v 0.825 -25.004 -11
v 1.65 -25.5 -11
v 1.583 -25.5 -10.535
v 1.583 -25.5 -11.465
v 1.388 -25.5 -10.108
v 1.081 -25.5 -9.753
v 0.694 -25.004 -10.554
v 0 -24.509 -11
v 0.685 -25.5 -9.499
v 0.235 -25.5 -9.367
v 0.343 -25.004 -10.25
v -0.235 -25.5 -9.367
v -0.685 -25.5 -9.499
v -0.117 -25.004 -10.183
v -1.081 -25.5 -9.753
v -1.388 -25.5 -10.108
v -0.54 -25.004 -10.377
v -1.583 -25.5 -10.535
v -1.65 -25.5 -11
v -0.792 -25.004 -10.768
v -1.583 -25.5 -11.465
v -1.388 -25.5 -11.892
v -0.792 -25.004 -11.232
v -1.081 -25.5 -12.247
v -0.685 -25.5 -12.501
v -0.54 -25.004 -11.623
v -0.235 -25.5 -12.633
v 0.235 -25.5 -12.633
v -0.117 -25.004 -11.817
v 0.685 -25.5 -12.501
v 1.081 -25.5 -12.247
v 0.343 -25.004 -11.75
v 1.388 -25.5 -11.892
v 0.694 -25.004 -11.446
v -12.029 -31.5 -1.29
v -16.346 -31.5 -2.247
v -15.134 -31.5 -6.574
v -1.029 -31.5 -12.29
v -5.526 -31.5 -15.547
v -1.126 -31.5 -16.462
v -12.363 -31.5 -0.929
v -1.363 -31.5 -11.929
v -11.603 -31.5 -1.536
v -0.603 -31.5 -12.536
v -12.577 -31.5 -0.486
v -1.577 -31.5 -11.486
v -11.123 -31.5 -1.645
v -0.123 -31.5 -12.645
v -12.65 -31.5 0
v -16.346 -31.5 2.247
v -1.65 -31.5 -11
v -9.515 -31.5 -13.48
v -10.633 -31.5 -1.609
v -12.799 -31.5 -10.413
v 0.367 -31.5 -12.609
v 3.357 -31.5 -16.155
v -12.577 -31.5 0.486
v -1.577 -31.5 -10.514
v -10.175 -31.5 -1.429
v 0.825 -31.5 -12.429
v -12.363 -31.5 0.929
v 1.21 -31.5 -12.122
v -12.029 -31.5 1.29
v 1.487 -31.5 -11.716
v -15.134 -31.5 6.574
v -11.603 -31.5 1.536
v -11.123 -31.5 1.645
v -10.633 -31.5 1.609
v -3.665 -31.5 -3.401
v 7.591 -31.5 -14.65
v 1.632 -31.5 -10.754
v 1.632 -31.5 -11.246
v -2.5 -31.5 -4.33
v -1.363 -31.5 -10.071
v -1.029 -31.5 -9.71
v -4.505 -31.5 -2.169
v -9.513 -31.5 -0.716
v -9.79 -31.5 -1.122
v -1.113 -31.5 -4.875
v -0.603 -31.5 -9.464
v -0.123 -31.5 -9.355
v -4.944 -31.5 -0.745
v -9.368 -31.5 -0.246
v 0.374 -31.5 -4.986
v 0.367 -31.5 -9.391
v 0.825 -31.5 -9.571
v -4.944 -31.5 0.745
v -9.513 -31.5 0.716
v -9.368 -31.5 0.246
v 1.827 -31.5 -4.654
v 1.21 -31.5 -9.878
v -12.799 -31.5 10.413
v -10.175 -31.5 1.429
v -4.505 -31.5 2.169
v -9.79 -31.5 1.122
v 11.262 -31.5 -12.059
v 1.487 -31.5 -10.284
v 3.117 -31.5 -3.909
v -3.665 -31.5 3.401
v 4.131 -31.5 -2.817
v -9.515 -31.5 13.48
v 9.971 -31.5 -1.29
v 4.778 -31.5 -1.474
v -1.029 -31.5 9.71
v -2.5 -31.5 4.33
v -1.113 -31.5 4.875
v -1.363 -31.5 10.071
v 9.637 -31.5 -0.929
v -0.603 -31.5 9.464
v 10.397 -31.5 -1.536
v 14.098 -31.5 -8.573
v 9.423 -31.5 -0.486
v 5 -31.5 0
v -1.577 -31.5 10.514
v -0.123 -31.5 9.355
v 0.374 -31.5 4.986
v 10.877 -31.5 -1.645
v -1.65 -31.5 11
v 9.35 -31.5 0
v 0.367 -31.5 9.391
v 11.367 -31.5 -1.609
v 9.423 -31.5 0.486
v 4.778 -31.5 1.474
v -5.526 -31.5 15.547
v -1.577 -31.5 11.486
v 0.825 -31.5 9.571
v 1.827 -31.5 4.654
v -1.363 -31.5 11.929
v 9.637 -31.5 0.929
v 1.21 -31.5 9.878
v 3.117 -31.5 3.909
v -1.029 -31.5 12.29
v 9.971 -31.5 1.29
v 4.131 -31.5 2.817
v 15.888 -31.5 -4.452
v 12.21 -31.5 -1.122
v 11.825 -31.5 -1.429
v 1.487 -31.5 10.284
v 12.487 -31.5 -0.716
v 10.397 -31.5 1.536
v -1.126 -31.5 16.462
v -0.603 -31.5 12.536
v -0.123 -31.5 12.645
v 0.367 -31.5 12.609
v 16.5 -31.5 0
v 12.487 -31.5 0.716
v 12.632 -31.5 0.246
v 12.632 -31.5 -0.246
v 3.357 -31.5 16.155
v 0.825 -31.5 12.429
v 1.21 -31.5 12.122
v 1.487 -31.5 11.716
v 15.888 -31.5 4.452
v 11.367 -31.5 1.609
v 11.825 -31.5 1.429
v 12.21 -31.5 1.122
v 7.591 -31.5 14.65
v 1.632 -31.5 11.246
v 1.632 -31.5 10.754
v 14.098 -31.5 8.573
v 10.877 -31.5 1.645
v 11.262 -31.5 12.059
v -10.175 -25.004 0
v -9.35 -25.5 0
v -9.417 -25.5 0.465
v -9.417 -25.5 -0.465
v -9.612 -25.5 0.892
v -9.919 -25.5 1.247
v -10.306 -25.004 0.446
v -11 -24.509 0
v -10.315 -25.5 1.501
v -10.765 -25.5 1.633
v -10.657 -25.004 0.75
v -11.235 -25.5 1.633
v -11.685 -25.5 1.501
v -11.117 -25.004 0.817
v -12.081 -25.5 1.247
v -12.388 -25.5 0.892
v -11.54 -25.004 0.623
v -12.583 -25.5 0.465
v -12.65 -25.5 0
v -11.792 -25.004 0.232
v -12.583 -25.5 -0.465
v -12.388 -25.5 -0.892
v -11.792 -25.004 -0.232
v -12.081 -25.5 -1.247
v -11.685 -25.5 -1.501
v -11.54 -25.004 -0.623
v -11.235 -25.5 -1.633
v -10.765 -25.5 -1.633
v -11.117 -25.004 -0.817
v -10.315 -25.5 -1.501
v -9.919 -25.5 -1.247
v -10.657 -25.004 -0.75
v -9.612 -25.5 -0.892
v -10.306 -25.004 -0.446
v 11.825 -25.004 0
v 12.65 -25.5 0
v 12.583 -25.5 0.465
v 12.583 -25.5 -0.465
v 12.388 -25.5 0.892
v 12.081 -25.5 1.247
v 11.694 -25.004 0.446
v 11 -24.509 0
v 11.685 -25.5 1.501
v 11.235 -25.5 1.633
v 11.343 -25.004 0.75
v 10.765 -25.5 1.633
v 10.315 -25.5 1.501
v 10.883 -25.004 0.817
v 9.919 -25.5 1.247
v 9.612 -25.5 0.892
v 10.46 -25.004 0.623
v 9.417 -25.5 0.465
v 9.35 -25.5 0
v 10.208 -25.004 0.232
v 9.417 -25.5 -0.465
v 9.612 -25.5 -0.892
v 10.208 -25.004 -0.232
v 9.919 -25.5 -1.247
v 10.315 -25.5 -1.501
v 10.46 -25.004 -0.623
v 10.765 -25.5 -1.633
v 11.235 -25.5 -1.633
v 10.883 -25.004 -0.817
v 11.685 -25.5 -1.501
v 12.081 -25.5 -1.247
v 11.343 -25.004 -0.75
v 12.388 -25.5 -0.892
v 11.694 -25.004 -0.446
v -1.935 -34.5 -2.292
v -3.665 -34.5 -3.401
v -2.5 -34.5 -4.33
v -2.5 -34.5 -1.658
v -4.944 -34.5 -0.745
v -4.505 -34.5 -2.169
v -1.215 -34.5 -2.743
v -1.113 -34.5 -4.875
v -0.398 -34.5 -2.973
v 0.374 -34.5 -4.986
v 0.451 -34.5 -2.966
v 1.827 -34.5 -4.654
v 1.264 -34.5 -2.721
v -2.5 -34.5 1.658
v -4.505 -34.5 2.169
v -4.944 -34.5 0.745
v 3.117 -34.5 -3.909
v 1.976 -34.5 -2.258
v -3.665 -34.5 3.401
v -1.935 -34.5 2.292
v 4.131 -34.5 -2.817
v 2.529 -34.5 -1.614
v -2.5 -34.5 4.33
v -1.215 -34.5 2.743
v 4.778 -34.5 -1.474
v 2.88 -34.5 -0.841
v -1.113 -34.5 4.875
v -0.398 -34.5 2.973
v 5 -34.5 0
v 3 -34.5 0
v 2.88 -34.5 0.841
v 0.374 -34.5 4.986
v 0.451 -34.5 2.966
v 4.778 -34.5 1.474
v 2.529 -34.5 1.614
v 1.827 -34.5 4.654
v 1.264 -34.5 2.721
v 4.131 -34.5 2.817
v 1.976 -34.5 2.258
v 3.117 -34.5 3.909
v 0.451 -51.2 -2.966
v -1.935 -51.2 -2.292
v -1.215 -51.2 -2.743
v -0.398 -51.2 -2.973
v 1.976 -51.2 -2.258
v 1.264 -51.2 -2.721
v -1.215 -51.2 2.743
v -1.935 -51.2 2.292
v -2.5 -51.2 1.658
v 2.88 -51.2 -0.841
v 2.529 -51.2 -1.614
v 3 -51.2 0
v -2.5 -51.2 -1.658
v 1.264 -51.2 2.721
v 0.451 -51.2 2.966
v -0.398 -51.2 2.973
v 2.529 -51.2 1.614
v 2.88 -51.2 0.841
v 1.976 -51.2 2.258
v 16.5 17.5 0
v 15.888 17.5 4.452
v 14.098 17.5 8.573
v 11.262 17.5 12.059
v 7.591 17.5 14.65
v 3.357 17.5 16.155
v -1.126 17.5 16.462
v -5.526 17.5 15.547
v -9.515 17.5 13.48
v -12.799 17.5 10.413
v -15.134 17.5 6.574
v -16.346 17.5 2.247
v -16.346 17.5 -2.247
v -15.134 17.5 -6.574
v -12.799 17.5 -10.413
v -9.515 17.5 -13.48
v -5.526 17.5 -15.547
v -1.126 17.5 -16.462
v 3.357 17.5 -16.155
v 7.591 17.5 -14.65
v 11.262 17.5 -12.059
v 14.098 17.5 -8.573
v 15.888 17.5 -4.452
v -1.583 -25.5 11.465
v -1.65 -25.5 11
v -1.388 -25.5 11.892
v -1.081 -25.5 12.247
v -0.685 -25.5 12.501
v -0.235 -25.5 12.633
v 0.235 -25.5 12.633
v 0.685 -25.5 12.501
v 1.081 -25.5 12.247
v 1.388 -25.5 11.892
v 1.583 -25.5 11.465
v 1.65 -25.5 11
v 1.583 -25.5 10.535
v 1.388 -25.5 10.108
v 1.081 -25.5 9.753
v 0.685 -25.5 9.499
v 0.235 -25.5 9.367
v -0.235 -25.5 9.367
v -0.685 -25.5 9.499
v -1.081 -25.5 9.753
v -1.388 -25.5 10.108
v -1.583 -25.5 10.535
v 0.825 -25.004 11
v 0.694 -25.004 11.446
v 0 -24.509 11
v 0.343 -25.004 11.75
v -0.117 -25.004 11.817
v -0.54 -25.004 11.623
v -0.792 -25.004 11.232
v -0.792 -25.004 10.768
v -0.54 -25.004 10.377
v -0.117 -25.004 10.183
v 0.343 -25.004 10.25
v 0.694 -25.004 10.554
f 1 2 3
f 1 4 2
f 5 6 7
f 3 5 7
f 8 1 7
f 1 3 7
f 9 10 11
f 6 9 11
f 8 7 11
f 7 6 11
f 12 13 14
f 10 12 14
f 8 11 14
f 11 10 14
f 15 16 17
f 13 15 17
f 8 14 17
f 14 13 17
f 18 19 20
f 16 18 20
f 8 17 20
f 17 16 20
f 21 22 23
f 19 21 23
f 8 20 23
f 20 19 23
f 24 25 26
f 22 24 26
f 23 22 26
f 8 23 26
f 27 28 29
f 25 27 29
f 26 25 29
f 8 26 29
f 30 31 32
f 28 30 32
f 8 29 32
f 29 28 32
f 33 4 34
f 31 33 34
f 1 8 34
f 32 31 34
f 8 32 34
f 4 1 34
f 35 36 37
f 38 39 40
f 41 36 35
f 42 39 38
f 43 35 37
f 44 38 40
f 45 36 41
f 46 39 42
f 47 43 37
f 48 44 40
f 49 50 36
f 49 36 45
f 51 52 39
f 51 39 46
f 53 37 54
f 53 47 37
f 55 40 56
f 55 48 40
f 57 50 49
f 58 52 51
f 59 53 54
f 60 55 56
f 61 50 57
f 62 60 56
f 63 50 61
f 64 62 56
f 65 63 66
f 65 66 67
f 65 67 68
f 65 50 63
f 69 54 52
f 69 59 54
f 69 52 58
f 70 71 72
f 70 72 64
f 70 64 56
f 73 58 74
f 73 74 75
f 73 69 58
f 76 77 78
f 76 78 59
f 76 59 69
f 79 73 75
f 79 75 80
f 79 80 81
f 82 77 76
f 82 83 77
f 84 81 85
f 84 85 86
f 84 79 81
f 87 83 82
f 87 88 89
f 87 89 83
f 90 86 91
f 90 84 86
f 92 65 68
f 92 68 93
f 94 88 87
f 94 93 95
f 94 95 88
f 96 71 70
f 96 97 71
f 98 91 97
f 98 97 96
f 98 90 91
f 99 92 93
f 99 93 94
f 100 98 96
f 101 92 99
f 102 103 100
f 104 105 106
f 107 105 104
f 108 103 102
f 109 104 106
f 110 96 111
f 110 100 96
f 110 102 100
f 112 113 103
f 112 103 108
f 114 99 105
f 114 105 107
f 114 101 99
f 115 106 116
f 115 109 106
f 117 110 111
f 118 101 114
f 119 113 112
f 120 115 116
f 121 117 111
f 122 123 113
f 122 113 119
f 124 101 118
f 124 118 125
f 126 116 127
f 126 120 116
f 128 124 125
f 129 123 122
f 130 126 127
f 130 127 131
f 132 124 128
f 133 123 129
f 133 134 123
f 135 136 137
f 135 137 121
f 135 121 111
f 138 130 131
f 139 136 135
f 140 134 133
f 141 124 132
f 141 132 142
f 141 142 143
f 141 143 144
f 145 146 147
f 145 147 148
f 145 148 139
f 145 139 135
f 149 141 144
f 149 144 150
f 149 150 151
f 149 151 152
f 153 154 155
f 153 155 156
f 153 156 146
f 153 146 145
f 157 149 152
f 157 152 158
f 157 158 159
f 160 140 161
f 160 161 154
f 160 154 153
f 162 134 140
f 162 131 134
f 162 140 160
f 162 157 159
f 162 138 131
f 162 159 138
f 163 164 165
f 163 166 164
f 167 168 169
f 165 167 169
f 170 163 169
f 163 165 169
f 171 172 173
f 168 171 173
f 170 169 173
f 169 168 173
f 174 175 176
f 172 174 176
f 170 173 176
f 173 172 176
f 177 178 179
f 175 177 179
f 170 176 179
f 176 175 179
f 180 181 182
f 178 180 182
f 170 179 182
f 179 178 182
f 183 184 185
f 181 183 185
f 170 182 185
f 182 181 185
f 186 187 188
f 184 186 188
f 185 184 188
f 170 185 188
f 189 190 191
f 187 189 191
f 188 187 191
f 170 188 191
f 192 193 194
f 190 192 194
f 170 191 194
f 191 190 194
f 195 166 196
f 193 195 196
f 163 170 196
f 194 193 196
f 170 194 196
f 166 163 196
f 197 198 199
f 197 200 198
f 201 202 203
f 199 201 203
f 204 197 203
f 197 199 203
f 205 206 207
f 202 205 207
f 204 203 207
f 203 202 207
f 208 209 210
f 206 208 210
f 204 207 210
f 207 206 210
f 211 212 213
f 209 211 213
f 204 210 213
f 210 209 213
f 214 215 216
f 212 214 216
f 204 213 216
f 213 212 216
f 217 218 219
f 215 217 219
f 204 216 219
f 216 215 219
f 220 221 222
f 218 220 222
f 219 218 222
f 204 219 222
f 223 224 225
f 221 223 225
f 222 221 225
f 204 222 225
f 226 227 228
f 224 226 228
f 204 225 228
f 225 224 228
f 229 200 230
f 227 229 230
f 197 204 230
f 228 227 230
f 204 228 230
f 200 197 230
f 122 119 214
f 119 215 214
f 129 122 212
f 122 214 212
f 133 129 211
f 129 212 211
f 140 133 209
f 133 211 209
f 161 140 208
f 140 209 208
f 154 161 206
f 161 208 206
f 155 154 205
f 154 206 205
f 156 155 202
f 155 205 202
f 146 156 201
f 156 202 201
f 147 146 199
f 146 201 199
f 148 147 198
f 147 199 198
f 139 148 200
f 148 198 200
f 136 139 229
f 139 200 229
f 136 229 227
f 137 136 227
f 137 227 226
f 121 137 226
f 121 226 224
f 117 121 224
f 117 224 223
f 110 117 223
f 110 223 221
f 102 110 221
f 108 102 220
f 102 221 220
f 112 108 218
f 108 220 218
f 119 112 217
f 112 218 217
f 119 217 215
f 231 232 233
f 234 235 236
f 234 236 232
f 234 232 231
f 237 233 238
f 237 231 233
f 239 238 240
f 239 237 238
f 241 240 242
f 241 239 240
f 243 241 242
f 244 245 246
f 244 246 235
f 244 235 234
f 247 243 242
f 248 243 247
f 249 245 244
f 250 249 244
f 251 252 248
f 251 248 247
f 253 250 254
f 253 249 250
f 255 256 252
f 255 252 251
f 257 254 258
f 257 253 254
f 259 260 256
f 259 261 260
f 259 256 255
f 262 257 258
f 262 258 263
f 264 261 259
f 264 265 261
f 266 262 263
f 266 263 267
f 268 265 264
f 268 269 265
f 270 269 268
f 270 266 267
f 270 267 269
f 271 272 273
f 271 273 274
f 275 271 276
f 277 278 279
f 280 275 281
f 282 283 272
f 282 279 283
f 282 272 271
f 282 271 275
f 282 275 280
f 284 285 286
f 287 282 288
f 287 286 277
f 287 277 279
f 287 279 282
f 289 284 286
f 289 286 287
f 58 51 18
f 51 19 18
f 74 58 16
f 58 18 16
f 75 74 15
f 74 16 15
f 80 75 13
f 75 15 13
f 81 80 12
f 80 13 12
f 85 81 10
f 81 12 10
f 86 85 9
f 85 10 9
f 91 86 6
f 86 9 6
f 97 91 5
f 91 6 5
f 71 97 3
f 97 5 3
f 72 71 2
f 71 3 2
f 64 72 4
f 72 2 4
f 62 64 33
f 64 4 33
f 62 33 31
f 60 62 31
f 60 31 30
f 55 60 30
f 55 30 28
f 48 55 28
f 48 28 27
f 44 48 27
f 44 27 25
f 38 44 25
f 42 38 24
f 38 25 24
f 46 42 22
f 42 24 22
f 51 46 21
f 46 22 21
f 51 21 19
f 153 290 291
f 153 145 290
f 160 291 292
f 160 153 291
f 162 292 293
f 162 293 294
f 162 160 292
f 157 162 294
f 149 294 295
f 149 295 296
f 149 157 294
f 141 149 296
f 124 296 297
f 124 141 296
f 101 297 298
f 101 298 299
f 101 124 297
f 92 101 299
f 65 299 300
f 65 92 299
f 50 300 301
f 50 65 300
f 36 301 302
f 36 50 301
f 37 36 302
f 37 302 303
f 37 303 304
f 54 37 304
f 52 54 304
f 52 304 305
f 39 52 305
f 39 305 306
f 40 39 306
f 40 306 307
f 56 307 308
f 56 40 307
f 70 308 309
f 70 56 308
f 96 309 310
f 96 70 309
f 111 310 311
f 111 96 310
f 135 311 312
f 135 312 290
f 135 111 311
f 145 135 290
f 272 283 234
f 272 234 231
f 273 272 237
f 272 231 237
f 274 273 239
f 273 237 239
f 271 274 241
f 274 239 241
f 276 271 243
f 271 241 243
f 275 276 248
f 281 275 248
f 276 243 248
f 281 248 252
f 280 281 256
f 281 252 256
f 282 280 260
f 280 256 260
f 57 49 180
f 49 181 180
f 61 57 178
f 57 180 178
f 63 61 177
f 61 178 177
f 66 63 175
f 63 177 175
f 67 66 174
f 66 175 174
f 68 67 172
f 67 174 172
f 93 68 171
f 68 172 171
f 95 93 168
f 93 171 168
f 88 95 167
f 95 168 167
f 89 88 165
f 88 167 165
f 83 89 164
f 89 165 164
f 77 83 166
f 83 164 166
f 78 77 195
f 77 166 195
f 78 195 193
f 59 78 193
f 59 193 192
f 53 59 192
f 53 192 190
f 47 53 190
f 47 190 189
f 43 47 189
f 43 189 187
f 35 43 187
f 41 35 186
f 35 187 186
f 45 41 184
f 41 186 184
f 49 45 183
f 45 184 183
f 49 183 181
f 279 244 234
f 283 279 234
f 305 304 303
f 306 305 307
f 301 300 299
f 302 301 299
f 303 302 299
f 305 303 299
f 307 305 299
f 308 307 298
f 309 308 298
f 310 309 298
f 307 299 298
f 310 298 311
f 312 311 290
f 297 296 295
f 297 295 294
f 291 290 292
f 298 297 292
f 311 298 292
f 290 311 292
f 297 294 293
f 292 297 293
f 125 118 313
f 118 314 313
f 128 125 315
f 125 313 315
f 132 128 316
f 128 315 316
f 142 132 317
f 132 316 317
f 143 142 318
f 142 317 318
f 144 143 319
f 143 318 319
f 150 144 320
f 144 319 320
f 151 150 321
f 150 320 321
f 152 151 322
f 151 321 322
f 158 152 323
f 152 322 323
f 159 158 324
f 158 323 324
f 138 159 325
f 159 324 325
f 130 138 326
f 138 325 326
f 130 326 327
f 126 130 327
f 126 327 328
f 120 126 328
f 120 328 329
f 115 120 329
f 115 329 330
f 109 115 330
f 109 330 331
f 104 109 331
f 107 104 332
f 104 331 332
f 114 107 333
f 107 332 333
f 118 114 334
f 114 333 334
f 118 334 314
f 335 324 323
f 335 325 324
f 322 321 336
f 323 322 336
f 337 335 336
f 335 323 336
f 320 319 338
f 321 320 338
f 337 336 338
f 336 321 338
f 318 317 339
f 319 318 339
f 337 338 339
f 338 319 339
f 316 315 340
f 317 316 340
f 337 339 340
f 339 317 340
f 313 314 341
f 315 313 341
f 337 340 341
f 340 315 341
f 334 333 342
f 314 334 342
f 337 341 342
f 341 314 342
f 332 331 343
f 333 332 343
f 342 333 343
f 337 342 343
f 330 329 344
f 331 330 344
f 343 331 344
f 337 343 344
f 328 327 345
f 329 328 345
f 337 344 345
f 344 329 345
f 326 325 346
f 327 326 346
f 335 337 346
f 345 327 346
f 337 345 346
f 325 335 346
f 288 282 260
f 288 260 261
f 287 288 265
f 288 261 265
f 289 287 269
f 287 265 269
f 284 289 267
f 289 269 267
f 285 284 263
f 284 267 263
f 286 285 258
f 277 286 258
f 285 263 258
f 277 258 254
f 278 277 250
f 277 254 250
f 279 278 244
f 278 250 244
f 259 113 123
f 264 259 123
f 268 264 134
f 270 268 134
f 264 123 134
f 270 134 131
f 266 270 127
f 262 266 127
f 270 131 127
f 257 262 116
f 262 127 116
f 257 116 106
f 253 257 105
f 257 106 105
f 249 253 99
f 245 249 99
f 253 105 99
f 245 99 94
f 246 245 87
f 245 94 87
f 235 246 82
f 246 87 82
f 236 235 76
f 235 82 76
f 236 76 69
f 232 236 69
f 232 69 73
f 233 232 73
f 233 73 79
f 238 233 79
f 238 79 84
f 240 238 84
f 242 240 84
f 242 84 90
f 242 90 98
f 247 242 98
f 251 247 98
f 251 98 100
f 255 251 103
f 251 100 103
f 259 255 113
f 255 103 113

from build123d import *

# Parameters (mm, degrees)
F0_R     = 16.5
F1_DEPTH = 31.5
F2_DEPTH = 17.5
F4_DEPTH = 19.7
F3_R     = 5
F5_DEPTH = 3
F6_D     = 3.3
F6_DEPTH = 6
F6_TIP   = 0.9914200214


with BuildPart() as f1:
    # F0 (on Front) → F1 (new body)
    with BuildSketch(Plane.XZ):
        Circle(F0_R)
    extrude(amount=F1_DEPTH)

    # F2 (add): a face of the model
    f2_faces = [f1.faces().sort_by_distance(p)[0] for p in [
        (0, 0, 0),
    ]]
    extrude(f2_faces, amount=F2_DEPTH)

    # F3 (on face) → F4 (join)
    with BuildSketch(Plane.XZ.offset(31.5)):
        with BuildLine():
            ThreePointArc((-2.5, -1.6583123952), (0.8660254038, -2.8722813233), (3, 0))
            ThreePointArc((3, 0), (0.8660254038, 2.8722813233), (-2.5, 1.6583123952))
            Line((-2.5, 1.6583123952), (-2.5, -1.6583123952))
        make_face()
    extrude(amount=F4_DEPTH)

    # F3 (on face) → F5 (join)
    with BuildSketch(Plane.XZ.offset(31.5)):
        Circle(F3_R)
        with BuildLine():
            ThreePointArc((-2.5, 1.6583123952), (0.8660254038, 2.8722813233), (3, 0))
            ThreePointArc((3, 0), (0.8660254038, -2.8722813233), (-2.5, -1.6583123952))
            ThreePointArc((-2.5, -1.6583123952), (-3, 0), (-2.5, 1.6583123952))
        make_face(mode=Mode.SUBTRACT)
        with BuildLine():
            Line((-2.5, -1.6583123952), (-2.5, 1.6583123952))
            ThreePointArc((-2.5, 1.6583123952), (-3, 0), (-2.5, -1.6583123952))
        make_face()
    extrude(amount=F5_DEPTH)

    # F6
    with Locations(Plane.XZ.offset(31.5)):
        with Locations((11, 0), (0, -11), (0, 11), (-11, 0)):
            Hole(F6_D / 2, depth=F6_DEPTH)
            with Locations((0, 0, -(F6_DEPTH + F6_TIP / 2))):  # 118° drill point
                Cone(0, F6_D / 2, F6_TIP, mode=Mode.SUBTRACT)


solid = f1.part
